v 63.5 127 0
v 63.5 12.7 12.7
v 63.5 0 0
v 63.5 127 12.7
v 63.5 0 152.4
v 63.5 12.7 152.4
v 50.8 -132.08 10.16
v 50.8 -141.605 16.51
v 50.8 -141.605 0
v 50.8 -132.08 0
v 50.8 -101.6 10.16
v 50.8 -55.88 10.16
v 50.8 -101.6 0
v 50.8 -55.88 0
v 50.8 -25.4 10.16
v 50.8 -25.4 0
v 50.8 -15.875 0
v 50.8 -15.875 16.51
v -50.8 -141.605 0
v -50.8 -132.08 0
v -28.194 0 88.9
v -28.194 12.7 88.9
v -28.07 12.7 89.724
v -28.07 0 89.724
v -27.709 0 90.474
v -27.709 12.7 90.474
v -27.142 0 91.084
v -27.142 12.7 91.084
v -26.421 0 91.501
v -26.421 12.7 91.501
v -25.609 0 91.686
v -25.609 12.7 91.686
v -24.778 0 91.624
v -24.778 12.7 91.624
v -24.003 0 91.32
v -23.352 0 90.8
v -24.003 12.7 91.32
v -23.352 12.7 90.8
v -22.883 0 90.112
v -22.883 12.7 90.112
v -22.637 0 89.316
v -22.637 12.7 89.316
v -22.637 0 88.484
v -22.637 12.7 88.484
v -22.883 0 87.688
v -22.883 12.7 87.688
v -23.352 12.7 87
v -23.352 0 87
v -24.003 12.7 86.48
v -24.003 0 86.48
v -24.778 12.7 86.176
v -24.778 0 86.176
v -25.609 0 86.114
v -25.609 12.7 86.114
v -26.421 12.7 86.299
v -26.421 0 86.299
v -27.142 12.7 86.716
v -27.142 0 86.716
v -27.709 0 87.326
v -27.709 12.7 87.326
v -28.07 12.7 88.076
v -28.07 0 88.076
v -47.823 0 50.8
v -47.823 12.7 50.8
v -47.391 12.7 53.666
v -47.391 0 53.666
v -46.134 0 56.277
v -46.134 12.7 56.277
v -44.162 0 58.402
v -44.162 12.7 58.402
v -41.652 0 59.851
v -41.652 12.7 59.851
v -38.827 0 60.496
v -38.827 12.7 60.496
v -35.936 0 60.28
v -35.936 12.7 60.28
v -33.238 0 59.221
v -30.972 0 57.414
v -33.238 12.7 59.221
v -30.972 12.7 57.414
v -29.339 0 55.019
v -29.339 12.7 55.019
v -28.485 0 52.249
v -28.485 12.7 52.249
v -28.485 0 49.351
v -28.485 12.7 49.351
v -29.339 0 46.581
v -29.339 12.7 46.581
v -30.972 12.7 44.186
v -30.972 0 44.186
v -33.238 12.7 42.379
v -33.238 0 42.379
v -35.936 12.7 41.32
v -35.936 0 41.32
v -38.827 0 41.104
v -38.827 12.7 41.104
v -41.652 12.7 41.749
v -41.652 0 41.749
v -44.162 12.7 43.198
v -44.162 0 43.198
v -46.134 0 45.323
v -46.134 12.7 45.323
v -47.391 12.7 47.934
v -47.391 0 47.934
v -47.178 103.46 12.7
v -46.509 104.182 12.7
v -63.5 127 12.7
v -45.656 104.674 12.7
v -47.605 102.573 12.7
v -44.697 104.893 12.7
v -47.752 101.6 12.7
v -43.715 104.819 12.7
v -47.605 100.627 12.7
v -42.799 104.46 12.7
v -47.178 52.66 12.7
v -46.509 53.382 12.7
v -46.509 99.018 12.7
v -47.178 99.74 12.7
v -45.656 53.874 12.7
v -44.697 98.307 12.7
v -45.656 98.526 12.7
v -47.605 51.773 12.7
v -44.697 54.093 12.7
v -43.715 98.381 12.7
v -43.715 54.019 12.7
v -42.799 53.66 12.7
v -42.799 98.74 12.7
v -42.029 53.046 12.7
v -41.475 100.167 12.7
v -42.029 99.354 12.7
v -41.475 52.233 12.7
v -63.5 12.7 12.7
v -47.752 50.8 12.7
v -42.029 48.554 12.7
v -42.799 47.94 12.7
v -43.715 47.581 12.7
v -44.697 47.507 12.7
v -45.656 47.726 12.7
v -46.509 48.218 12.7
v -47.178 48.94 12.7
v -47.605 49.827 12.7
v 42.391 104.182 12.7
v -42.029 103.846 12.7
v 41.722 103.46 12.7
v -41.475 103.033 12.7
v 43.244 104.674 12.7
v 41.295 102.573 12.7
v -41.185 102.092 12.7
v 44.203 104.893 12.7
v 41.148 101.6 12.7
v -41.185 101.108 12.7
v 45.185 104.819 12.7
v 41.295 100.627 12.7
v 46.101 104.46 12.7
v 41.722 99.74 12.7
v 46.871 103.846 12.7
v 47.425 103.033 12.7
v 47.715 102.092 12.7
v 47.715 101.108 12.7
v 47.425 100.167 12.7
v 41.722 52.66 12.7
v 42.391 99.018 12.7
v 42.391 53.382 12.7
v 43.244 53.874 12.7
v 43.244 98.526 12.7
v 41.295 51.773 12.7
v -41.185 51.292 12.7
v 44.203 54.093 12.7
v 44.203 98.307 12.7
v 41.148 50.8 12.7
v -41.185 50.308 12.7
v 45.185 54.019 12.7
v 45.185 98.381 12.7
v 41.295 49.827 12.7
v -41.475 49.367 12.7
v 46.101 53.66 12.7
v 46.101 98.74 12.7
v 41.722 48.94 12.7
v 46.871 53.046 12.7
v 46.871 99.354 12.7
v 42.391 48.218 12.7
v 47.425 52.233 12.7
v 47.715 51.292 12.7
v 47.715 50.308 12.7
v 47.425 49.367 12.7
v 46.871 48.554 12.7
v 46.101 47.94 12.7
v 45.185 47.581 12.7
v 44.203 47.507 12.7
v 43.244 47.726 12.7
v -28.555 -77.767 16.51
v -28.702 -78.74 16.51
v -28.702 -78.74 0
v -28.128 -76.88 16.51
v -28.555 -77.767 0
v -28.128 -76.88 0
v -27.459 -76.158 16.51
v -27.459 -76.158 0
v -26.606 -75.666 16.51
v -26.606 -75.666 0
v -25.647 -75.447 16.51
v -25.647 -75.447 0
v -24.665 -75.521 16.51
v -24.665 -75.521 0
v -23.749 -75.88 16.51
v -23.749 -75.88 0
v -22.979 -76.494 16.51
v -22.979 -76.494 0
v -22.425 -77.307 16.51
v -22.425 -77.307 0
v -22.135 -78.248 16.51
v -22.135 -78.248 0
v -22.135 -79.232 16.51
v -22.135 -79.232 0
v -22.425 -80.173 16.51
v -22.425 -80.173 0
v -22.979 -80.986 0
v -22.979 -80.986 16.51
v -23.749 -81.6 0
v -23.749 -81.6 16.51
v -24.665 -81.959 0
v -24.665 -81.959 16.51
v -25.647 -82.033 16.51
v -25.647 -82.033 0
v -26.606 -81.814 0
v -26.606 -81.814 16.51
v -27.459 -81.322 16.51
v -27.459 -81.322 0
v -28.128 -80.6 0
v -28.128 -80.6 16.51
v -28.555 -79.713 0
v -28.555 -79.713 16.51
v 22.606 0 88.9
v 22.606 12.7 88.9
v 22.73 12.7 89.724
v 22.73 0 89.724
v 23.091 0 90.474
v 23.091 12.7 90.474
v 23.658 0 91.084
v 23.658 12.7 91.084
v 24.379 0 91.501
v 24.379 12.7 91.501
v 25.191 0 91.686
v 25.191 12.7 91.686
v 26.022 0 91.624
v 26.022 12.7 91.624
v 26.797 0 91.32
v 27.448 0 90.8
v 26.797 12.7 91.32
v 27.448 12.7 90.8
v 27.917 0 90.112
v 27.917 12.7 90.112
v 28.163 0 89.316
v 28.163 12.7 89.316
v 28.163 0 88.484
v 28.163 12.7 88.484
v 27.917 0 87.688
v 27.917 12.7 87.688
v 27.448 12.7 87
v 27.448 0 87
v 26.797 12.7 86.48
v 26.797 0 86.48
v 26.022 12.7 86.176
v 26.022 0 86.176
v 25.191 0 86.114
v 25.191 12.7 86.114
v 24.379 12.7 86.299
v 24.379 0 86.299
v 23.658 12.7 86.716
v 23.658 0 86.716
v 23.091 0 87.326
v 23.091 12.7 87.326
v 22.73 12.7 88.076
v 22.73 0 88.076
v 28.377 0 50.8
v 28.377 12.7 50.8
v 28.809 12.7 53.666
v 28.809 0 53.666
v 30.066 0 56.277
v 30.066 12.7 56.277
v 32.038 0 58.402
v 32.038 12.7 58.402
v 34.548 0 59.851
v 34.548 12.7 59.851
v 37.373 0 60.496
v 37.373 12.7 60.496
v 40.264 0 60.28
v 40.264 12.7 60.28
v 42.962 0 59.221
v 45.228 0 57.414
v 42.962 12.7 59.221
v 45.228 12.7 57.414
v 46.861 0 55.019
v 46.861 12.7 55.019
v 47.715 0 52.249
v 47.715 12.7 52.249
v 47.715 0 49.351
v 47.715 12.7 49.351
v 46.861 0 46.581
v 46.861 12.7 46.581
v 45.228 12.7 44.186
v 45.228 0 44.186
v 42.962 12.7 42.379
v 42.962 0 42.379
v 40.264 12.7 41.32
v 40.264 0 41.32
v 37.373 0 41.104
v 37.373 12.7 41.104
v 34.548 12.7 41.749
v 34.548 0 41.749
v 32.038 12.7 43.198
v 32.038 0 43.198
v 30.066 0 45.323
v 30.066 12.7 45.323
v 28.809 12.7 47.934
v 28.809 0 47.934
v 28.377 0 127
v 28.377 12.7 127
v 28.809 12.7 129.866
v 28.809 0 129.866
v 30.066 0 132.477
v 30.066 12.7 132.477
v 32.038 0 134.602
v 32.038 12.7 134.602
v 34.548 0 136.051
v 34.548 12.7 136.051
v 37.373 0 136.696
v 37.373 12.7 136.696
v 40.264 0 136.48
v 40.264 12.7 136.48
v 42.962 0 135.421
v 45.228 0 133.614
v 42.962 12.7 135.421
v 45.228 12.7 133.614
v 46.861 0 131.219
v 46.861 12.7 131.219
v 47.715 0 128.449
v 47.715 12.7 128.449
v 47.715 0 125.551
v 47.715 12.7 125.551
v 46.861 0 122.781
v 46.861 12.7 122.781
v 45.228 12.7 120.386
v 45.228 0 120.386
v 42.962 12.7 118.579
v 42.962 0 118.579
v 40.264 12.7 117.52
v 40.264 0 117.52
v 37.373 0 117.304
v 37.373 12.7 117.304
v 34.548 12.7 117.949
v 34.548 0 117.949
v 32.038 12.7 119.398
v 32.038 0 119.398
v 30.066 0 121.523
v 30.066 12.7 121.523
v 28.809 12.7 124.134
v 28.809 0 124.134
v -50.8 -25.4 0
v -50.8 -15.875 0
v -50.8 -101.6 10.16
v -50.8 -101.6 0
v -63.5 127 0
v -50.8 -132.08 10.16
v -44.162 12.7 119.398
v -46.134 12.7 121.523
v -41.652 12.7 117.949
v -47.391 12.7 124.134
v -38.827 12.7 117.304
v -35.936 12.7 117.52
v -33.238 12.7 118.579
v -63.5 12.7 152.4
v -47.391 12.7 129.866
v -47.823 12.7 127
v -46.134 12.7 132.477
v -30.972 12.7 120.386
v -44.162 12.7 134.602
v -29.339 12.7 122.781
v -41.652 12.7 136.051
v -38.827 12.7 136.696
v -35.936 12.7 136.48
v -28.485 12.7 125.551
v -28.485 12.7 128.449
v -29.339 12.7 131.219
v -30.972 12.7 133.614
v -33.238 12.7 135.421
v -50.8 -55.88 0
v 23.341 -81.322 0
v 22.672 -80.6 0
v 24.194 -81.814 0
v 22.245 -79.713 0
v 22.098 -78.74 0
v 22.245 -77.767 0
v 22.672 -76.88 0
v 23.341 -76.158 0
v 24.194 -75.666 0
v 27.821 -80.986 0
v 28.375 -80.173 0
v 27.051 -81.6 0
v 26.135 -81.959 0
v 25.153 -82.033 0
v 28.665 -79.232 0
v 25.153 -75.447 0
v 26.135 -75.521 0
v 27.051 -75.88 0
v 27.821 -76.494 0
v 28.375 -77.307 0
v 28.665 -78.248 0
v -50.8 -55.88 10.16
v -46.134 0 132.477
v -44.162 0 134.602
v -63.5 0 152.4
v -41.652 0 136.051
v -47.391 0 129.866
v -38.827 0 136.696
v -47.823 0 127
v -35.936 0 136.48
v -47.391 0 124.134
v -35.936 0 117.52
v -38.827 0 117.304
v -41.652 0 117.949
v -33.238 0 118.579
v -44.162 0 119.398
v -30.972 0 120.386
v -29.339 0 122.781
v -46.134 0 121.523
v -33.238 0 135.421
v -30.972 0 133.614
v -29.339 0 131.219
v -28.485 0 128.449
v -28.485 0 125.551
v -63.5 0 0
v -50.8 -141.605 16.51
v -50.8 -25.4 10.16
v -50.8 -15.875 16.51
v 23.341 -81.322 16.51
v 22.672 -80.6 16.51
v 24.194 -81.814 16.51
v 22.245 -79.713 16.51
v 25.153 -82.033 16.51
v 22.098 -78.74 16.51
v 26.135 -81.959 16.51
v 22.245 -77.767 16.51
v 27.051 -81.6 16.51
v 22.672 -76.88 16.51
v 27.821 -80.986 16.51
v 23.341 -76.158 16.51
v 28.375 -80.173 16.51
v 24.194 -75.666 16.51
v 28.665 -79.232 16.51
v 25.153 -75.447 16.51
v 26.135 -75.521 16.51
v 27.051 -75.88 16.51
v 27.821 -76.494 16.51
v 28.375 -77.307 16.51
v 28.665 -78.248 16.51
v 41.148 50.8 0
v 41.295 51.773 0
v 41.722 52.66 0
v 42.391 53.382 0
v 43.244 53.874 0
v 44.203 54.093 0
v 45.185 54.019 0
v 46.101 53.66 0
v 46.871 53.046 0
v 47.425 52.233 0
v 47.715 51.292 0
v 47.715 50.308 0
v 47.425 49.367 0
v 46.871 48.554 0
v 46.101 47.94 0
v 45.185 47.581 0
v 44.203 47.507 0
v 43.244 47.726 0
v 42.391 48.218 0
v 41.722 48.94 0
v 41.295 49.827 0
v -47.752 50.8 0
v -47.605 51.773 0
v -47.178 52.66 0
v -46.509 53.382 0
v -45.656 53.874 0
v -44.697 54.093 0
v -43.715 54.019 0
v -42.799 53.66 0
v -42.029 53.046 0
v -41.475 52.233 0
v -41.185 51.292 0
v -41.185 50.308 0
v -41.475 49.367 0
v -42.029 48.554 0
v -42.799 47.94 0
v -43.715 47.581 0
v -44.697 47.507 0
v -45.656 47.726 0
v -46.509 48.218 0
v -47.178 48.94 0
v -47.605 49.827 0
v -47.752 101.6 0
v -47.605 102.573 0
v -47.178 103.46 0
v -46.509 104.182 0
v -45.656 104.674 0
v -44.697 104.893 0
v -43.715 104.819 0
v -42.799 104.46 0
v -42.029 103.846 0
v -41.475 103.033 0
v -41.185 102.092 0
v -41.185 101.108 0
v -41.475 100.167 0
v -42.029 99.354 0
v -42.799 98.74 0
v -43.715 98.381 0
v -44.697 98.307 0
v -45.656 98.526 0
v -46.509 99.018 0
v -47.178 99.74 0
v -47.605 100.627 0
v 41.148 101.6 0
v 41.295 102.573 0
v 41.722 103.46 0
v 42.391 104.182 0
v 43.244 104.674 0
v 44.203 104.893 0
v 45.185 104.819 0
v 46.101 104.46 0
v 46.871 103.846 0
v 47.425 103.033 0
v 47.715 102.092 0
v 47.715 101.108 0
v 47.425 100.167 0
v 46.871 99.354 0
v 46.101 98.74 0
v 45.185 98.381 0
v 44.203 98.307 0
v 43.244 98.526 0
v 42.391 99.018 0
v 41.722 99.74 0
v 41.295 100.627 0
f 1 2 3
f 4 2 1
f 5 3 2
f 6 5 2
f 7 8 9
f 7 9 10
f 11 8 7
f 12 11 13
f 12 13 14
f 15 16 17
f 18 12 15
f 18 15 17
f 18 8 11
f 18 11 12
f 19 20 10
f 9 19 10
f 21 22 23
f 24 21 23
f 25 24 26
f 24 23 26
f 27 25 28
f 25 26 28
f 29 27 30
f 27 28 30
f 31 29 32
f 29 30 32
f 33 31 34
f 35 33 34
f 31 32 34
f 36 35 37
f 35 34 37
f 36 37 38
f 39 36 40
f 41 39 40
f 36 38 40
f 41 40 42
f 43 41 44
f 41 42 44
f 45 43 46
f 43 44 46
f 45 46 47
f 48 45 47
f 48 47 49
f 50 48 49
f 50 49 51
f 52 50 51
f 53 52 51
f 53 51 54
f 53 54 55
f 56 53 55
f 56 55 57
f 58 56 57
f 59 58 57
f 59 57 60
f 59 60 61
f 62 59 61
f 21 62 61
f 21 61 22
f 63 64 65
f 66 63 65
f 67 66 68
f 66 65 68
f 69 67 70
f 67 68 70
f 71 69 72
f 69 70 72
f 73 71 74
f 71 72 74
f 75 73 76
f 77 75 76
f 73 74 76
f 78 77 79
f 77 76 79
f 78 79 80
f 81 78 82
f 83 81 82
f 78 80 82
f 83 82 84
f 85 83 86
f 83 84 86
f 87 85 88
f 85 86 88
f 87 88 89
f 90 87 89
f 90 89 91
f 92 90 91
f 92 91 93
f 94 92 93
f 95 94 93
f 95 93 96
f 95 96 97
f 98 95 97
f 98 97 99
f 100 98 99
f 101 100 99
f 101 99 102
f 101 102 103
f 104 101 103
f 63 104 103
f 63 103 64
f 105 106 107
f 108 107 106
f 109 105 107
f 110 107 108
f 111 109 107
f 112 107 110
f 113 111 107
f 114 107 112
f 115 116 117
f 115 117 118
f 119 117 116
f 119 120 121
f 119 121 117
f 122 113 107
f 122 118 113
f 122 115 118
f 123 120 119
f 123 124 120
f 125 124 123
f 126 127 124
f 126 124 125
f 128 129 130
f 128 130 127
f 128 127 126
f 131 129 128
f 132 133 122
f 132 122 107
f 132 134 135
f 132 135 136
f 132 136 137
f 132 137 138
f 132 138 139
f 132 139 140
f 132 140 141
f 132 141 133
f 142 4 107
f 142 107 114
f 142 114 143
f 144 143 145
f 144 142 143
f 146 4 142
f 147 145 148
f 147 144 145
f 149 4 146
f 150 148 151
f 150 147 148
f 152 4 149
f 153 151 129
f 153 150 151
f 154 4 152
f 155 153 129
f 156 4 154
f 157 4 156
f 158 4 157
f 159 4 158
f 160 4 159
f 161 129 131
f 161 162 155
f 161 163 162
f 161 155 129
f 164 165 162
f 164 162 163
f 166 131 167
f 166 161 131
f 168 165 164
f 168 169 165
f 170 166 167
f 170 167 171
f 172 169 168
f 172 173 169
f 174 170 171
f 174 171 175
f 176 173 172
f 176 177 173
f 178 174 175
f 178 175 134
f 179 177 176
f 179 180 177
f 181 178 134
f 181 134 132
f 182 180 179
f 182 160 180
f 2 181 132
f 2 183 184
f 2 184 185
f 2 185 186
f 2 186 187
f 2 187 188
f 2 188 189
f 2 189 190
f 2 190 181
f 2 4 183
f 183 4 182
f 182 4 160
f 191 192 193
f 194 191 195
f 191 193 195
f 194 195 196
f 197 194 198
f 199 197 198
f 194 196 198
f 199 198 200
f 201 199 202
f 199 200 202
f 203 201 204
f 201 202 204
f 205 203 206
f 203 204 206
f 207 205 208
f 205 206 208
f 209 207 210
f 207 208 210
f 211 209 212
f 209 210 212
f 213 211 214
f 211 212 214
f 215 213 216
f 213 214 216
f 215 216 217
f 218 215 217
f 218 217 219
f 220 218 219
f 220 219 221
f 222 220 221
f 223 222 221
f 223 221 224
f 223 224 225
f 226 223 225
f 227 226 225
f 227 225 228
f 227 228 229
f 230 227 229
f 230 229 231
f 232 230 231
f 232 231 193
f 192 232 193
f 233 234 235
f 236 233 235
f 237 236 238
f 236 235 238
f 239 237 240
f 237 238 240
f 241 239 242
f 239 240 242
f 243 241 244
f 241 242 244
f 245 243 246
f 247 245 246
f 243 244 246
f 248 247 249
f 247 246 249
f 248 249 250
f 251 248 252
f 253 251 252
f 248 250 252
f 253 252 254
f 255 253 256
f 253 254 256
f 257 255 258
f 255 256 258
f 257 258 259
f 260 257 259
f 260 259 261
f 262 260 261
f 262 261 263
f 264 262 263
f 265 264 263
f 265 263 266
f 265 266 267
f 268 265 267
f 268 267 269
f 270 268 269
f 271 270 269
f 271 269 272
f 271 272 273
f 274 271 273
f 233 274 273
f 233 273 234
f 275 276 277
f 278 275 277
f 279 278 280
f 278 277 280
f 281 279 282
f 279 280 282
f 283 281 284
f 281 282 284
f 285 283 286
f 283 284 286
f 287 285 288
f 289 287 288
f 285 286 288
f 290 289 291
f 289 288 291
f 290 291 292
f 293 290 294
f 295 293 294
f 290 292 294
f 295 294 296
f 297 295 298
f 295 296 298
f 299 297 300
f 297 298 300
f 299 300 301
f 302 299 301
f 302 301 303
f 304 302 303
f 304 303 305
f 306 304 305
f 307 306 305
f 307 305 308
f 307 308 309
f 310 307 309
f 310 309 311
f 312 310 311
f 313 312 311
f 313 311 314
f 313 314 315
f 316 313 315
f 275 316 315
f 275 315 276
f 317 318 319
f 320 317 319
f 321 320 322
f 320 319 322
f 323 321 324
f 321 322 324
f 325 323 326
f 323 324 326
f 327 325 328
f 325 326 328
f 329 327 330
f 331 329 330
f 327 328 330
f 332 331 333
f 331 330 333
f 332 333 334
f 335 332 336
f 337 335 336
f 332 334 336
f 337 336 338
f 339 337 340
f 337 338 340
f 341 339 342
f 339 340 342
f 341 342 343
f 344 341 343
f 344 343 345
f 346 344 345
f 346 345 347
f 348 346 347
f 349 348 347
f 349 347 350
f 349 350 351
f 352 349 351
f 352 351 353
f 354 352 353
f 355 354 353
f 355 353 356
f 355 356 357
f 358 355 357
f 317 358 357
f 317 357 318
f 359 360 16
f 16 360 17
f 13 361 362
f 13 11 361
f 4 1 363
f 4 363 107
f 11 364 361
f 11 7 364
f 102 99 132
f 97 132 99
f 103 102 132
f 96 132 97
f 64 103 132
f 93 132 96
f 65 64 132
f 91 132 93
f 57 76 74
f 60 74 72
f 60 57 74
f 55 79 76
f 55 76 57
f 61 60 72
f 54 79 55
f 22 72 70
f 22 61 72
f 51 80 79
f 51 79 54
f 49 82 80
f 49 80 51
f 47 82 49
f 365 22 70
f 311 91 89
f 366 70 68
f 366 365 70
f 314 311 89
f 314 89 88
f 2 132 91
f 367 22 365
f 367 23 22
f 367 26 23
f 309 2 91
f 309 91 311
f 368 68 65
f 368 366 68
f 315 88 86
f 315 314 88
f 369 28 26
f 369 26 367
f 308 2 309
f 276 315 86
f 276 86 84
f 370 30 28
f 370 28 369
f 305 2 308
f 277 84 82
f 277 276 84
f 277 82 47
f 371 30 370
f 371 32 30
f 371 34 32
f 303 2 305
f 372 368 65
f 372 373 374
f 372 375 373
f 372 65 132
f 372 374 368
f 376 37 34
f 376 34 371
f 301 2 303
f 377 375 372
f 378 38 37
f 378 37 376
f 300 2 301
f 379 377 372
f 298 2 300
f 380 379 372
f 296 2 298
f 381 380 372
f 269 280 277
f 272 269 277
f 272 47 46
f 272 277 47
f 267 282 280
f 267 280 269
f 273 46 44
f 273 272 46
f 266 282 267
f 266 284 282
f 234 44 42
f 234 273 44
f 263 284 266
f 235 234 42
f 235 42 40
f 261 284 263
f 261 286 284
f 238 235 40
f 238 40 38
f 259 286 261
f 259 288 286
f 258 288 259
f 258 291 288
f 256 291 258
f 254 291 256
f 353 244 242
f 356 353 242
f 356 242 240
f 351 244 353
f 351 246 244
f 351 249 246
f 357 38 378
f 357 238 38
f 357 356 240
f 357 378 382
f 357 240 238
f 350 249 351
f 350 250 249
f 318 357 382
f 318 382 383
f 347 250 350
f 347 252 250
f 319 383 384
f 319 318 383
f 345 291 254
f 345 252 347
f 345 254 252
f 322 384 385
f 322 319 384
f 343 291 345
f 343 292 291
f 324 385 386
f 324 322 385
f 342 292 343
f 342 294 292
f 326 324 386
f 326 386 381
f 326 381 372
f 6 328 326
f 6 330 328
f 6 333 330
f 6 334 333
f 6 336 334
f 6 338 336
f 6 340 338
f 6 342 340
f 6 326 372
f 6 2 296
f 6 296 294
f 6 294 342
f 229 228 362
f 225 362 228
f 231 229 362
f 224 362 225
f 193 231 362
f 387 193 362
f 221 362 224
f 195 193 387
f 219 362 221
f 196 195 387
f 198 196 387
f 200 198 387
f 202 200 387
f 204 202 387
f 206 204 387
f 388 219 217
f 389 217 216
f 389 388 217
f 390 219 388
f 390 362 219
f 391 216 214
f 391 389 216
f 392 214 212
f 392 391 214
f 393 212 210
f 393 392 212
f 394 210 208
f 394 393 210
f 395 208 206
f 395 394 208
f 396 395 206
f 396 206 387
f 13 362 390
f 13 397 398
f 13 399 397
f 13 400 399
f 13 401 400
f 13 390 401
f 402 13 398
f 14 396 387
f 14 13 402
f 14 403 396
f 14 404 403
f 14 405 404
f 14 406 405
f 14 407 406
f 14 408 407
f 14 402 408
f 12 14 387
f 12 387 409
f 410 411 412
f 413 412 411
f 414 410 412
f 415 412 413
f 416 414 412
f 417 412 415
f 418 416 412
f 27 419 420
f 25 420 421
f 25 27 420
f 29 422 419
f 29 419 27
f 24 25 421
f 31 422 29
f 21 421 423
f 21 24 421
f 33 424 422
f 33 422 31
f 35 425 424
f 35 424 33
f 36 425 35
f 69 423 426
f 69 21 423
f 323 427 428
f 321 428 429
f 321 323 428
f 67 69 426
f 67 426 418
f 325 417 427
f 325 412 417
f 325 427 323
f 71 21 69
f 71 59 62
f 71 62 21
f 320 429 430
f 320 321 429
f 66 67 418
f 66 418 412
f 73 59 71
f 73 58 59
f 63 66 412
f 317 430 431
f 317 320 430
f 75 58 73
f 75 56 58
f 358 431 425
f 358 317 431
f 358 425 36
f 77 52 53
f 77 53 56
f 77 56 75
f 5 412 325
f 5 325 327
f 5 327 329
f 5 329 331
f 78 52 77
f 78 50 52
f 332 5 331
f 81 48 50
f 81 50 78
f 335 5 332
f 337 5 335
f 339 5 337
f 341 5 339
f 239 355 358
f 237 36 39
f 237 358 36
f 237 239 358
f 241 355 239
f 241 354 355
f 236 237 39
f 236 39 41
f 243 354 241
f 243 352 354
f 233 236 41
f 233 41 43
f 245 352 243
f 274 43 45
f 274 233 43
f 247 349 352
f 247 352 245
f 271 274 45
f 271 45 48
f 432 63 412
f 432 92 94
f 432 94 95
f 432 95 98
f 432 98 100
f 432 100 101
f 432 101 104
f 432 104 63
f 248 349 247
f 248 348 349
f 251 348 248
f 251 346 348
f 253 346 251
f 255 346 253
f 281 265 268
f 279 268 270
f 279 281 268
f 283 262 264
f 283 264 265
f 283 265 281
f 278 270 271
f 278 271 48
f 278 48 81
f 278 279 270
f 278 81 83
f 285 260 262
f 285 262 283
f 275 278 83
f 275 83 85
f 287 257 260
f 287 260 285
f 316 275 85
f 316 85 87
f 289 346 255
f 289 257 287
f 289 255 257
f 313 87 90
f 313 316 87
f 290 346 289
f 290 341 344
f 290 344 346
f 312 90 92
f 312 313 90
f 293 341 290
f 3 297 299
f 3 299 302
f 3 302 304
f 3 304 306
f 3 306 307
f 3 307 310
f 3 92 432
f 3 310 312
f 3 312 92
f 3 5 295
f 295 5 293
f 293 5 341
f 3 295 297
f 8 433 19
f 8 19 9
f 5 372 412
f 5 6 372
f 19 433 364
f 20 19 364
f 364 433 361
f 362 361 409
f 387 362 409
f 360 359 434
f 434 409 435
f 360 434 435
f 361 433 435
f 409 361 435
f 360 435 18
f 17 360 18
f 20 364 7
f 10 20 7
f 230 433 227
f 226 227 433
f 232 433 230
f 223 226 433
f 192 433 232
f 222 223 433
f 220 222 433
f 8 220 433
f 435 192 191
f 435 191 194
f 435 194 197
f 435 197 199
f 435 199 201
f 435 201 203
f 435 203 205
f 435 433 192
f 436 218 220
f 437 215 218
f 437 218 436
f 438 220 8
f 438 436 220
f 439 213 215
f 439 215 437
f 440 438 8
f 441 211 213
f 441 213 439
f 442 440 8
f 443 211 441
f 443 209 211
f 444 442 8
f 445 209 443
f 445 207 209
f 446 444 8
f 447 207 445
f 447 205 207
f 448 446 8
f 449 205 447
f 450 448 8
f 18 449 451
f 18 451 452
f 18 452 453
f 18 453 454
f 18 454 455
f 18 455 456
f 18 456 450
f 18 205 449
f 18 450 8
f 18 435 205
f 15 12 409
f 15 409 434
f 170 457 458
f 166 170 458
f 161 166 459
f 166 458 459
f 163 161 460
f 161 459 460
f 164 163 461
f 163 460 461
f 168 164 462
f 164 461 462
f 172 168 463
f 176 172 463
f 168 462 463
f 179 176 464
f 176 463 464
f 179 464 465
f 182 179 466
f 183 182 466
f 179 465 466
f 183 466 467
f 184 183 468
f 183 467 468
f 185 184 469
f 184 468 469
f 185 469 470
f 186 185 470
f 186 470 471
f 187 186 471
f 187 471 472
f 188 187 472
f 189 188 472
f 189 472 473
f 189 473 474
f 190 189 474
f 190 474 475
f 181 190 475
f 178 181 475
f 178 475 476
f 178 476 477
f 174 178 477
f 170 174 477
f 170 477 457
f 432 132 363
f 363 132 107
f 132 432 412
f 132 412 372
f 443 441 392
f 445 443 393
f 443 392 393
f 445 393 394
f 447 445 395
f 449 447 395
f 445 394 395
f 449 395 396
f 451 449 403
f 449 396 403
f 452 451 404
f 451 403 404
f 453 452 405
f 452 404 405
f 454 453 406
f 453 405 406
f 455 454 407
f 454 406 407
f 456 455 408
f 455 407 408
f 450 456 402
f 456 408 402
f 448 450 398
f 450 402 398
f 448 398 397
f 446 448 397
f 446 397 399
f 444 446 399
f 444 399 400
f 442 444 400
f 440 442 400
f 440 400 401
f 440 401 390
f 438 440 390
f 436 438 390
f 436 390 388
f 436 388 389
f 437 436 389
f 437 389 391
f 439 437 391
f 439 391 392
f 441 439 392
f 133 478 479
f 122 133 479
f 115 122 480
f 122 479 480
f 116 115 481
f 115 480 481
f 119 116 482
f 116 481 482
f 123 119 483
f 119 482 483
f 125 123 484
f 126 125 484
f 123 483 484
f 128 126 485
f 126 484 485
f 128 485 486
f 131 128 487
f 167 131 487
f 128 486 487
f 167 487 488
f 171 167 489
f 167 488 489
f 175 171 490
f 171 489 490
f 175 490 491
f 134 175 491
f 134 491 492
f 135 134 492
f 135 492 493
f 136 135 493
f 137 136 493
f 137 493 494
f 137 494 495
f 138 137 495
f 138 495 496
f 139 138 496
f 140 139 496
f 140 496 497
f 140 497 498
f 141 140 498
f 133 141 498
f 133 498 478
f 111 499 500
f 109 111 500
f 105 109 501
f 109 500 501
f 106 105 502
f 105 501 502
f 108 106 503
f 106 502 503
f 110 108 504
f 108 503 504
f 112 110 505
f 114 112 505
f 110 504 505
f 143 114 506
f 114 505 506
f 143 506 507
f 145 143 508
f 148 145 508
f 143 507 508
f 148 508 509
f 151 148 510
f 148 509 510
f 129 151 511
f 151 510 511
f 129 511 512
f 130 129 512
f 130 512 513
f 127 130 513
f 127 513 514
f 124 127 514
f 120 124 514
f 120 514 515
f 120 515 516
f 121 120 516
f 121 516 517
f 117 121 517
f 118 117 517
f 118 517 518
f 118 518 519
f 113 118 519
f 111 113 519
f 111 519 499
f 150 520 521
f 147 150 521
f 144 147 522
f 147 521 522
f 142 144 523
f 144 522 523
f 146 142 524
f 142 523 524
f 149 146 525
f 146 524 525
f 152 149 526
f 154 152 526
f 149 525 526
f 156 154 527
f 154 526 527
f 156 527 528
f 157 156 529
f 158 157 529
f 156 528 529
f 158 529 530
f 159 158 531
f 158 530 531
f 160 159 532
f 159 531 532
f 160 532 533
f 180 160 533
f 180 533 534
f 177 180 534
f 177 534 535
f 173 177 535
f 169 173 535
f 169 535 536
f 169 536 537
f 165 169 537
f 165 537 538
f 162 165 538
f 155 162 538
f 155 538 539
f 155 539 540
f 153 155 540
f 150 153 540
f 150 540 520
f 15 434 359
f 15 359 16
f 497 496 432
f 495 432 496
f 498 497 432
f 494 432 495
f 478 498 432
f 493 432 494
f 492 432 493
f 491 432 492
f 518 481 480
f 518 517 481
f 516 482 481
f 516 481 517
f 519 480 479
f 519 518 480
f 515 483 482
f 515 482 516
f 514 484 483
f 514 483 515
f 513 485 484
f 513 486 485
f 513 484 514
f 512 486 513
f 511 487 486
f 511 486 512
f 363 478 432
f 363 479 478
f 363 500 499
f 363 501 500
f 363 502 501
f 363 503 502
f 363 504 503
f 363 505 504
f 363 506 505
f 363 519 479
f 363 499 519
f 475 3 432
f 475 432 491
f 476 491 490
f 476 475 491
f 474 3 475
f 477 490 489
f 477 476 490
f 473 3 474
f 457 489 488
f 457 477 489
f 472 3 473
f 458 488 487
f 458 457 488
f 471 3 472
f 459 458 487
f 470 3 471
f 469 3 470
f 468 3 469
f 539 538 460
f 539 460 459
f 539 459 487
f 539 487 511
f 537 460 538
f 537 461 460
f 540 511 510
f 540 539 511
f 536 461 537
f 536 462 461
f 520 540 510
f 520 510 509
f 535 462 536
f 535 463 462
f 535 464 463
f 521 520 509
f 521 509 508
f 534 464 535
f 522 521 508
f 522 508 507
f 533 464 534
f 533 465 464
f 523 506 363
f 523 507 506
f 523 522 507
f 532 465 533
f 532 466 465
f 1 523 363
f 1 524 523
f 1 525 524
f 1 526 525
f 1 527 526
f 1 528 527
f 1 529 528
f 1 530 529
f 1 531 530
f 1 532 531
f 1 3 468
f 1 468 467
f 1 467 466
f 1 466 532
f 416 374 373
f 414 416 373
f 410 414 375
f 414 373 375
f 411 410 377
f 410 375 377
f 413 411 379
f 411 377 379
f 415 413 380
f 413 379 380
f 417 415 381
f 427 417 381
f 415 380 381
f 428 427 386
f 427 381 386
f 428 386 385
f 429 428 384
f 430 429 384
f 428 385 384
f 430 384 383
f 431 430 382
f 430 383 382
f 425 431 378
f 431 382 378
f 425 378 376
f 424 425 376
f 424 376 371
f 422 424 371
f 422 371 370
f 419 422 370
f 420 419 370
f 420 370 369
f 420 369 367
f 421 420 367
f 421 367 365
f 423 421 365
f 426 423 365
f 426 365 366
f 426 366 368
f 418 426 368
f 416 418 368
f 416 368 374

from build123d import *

# Parameters (mm, degrees)
F1_DEPTH  = 63.5
F3_D      = 19.446875
F5_DEPTH  = 50.8
F7_D      = 6.604
F9_D      = 5.588
F11_D     = 6.604
F12_W     = 101.6
F12_H     = 9.525
F13_DEPTH = 16.51


with BuildPart() as f1:
    # F0 (on Right) → F1 (new body, symmetric)
    with BuildSketch(Plane.YZ):
        Polygon((0, 152.4), (0, 0), (127, 0), (127, 12.7), (12.7, 12.7), (12.7, 152.4), align=None)
    extrude(amount=F1_DEPTH, both=True)

    # F3 (through all)
    with Locations(Plane.XZ):
        with Locations((-38.1, 127), (38.1, 127), (38.1, 50.8), (-38.1, 50.8)):
            Hole(F3_D / 2)

    # F9 (through all)
    with Locations(Plane.XZ):
        with Locations((-25.4, 88.9), (25.4, 88.9)):
            Hole(F9_D / 2)

    # F11 (through all)
    with Locations(Plane.XY.offset(12.7)):
        with Locations((44.45, 50.8), (-44.45, 50.8), (-44.45, 101.6), (44.45, 101.6)):
            Hole(F11_D / 2)


with BuildPart() as f5:
    # F4 (on Right) → F5 (new body, symmetric)
    with BuildSketch(Plane.YZ):
        Polygon((-101.6, 10.16), (-101.6, 0), (-55.88, 0), (-55.88, 10.16), (-25.4, 10.16), (-25.4, 16.51), (-132.08, 16.51), (-132.08, 10.16), align=None)
    extrude(amount=F5_DEPTH, both=True)

    # F7 (through all)
    with Locations(Plane.XY.offset(16.51)):
        with Locations((-25.4, -78.74), (25.4, -78.74)):
            Hole(F7_D / 2)

    # F12 (on face) → F13 (join)
    with BuildSketch(Plane.XY.offset(16.51)):
        with Locations((0, -20.6375)):
            Rectangle(F12_W, F12_H)
        with Locations((0, -136.8425)):
            Rectangle(F12_W, F12_H)
    extrude(amount=-F13_DEPTH)


solid = Compound([f1.part, f5.part])
